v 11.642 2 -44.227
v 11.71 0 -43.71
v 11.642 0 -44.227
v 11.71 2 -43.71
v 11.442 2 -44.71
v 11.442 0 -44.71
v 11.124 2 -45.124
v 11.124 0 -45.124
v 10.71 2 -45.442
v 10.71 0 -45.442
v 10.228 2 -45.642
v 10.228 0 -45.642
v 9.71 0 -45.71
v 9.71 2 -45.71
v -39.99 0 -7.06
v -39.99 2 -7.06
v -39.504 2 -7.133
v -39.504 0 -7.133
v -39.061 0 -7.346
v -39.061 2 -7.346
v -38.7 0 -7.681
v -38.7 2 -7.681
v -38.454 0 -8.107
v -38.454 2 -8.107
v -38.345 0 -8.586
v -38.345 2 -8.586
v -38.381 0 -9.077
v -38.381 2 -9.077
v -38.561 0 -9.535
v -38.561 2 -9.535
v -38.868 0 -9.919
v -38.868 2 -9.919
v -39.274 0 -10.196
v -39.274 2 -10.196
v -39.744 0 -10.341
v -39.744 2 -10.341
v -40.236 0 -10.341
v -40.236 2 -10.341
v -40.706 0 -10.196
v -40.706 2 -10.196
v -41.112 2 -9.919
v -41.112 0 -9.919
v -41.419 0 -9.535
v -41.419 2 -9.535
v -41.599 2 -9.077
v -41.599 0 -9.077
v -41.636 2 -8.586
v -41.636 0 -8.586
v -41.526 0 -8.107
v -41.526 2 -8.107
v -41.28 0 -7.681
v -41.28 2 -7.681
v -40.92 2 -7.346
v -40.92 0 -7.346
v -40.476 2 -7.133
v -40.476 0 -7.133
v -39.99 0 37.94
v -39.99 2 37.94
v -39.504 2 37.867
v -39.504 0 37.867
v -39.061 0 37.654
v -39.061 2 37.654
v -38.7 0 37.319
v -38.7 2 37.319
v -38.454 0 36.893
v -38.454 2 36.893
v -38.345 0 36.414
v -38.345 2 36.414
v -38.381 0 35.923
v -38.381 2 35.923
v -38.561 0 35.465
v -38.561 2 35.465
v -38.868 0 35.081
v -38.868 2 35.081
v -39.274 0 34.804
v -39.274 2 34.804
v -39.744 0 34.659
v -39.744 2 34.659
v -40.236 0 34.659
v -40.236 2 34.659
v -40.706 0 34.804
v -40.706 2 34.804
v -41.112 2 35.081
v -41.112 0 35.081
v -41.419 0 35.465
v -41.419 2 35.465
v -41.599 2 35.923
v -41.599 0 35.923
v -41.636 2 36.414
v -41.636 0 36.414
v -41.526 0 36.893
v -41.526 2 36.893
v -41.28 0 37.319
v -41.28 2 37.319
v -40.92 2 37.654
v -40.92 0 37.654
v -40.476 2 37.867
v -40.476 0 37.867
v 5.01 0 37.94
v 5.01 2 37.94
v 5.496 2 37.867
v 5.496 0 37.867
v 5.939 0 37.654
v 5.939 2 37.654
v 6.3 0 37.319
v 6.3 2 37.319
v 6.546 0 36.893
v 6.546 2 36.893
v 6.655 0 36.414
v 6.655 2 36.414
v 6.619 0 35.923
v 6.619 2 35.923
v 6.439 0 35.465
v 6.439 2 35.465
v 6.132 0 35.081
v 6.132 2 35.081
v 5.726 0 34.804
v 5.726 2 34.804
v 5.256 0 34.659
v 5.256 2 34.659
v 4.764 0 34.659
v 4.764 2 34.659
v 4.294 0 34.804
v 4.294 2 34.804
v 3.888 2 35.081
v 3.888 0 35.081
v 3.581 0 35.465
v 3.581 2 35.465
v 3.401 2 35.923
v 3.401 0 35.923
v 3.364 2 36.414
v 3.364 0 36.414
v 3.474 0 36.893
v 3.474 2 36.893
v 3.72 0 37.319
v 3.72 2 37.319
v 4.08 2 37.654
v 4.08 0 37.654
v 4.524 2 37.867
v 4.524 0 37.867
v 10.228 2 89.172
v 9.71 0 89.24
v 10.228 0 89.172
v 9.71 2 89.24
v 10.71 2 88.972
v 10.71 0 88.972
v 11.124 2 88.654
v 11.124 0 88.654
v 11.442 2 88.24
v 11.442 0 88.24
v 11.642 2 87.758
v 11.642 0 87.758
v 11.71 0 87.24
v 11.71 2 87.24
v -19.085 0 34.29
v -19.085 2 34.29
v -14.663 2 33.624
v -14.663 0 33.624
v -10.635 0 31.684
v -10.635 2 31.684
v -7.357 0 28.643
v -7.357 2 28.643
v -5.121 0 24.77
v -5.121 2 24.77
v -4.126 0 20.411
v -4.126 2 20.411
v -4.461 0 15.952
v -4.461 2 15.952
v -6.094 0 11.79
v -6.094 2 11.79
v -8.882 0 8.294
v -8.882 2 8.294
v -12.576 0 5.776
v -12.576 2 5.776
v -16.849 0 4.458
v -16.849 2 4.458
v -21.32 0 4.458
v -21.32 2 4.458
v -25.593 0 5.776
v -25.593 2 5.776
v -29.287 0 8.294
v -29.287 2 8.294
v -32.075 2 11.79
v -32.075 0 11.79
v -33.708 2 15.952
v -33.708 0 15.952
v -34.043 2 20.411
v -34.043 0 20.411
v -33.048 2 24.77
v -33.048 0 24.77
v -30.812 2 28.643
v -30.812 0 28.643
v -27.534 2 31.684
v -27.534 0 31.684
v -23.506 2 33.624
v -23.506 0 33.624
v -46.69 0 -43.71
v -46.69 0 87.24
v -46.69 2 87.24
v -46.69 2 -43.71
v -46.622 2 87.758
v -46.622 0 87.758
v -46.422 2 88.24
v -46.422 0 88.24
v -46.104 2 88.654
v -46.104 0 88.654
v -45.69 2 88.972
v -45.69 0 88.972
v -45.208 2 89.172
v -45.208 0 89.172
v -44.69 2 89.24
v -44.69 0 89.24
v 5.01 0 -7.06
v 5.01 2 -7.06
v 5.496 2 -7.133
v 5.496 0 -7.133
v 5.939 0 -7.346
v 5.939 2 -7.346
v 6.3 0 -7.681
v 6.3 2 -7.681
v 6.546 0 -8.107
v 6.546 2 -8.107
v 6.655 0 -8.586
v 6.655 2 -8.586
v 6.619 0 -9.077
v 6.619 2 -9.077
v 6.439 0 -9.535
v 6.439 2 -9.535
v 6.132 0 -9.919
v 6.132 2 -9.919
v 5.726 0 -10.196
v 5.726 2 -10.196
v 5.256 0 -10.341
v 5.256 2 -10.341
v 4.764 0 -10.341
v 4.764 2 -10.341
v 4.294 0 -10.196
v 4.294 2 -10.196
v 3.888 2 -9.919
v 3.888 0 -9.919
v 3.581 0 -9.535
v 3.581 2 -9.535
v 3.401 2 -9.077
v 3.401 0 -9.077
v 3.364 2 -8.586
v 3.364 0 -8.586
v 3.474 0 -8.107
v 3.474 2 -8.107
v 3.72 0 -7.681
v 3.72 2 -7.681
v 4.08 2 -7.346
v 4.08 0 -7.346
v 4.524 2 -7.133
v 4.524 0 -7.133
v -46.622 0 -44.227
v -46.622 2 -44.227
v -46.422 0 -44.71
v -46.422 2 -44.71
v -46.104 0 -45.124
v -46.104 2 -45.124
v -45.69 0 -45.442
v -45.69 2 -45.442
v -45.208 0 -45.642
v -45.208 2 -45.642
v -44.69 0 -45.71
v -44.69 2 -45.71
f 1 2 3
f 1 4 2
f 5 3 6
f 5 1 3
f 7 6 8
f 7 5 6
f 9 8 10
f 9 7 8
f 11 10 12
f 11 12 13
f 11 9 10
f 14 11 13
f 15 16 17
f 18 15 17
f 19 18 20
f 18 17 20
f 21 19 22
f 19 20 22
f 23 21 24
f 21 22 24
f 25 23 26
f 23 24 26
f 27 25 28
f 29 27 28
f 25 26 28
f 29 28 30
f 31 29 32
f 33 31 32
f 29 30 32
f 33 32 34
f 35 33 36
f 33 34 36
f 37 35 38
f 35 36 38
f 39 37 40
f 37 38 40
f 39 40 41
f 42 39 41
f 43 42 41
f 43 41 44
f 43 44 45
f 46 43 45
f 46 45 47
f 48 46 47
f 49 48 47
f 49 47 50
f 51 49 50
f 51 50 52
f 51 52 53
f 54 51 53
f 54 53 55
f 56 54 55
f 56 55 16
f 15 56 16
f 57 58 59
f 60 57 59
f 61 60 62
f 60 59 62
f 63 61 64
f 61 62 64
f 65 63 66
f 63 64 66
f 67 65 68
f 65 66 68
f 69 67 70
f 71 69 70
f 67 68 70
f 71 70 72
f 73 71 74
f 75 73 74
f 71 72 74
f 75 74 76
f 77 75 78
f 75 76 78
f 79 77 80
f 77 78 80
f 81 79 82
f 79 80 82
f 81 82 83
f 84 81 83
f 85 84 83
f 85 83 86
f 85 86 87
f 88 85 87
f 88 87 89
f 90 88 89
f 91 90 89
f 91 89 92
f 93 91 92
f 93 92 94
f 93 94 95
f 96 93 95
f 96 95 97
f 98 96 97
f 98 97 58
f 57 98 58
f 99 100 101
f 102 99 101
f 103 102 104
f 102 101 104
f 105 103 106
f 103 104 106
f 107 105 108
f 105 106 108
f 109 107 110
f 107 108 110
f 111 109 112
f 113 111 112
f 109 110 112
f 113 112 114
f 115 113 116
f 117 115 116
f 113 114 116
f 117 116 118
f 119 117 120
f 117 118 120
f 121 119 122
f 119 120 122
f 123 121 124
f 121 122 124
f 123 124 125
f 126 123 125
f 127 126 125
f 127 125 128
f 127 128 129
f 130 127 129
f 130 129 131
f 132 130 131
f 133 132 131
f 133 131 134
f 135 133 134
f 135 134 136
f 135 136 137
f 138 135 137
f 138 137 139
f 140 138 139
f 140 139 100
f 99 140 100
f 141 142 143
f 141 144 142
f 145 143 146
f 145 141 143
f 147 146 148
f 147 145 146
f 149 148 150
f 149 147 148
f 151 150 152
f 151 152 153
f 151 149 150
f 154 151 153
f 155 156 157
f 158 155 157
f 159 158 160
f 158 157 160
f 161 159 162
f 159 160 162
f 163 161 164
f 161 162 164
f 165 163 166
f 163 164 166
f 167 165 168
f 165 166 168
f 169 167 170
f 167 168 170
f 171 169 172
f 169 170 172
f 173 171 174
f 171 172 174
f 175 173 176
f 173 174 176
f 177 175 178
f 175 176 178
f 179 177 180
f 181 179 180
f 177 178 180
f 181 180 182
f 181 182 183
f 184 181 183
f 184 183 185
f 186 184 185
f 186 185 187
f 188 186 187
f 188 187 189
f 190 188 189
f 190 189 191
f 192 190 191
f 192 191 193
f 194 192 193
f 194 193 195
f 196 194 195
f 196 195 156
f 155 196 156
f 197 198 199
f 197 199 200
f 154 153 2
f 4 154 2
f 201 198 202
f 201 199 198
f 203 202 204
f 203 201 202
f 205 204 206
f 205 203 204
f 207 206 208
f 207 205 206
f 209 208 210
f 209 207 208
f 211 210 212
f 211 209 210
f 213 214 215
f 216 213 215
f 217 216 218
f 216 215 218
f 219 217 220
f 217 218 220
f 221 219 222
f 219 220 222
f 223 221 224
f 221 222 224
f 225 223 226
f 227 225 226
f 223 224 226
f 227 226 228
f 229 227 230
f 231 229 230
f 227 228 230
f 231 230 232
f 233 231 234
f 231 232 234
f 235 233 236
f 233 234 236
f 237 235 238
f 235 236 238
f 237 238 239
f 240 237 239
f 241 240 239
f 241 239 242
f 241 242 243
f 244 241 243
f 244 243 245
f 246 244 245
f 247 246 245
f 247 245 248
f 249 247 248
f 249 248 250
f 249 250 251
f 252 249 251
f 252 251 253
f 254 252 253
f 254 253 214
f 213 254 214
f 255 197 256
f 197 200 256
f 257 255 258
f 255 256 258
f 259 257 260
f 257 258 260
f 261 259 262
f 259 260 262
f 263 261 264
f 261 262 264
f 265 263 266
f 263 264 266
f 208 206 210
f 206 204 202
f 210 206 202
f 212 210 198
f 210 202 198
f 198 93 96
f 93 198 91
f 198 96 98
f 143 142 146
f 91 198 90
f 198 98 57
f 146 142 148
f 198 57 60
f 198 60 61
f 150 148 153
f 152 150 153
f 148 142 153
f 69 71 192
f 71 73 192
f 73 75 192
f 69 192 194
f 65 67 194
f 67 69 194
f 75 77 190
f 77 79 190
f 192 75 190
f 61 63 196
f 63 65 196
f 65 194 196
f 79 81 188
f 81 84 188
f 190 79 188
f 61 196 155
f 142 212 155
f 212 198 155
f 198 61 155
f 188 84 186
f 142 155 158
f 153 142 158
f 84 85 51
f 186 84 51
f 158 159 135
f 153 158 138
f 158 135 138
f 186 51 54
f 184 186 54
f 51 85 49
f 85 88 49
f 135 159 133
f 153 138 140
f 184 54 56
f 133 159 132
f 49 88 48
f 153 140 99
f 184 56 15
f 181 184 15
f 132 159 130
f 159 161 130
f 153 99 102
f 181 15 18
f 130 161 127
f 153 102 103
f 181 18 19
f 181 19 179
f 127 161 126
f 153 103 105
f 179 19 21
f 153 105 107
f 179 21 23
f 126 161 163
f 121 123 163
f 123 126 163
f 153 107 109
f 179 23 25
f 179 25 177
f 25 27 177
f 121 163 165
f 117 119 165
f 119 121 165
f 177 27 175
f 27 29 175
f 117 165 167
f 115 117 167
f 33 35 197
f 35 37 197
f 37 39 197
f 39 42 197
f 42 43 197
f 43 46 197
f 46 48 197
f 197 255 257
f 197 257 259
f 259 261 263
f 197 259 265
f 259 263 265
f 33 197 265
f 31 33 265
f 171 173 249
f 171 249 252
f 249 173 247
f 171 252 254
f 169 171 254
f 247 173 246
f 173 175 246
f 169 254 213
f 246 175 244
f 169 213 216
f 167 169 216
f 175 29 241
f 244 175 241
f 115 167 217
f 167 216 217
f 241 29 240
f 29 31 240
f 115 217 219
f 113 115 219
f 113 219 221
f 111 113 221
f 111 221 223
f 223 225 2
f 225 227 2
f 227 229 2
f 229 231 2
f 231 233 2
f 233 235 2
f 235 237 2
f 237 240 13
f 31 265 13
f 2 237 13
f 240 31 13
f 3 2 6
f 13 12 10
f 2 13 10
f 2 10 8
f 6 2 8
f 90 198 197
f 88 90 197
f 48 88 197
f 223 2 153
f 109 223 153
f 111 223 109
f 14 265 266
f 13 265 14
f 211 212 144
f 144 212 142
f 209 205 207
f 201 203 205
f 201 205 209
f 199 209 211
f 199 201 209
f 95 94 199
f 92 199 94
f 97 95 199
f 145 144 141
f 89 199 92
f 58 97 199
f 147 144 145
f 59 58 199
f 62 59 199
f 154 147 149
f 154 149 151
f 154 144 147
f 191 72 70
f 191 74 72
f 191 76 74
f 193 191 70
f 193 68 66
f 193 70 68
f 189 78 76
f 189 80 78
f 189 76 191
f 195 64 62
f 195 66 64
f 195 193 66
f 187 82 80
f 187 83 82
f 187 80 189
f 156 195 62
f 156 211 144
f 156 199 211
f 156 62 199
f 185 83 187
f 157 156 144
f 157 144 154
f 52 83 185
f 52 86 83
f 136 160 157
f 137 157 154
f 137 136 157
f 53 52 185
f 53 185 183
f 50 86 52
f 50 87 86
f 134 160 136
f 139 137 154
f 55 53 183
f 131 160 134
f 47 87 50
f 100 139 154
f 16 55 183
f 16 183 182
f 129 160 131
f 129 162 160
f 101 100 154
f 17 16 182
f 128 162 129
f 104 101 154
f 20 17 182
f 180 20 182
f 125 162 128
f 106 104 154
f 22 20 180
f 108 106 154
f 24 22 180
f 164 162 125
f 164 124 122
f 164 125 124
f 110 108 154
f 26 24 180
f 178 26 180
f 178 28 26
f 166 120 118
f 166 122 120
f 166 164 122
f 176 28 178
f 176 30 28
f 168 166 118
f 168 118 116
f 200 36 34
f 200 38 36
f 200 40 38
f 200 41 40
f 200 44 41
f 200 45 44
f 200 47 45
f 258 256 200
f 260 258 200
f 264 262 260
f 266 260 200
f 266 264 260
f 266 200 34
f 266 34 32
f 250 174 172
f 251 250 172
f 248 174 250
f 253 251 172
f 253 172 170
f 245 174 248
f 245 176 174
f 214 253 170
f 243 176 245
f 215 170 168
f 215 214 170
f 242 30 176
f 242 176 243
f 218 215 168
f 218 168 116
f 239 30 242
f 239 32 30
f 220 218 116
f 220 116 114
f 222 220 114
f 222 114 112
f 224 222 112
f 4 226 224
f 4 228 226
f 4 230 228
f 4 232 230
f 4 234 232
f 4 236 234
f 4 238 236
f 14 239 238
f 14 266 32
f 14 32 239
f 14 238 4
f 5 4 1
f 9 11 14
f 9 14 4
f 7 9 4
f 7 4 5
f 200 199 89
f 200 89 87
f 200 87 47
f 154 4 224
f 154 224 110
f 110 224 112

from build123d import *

# Parameters (mm, degrees)
SKETCH1_W           = 58.4
SKETCH1_H           = 134.95
BOSS_EXTRUDE1_DEPTH = 2
FILLET1_R           = 2
SKETCH2_R           = 1.65
CUT_EXTRUDE1_DEPTH  = 101.736235674
SKETCH3_R           = 15
CUT_EXTRUDE2_DEPTH  = 101.736235674


with BuildPart() as part:
    # Sketch1 → Boss-Extrude1 (new body)
    with BuildSketch(Plane(origin=(0, 0, 0), x_dir=(1, 0, 0), z_dir=(0, 1, 0))):
        with Locations((-17.49012047, -21.765247804)):
            Rectangle(SKETCH1_W, SKETCH1_H)
    extrude(amount=BOSS_EXTRUDE1_DEPTH)

    # Fillet1
    fillet1_edges = [part.edges().sort_by_distance(p)[0] for p in [
        (-46.69012047, 1, -45.709752196),
        (11.70987953, 1, -45.709752196),
        (11.70987953, 1, 89.240247804),
        (-46.69012047, 1, 89.240247804),
    ]]
    fillet(fillet1_edges, radius=FILLET1_R)

    # Sketch2 → Cut-Extrude1 (cut, through all)
    with BuildSketch(Plane(origin=(0, 2, 0), x_dir=(1, 0, 0), z_dir=(0, 1, 0))):
        with Locations(Location((-39.99012047, 8.709752196, 0), (0, 0, 270))):
            Circle(SKETCH2_R)
        with Locations(Location((5.00987953, 8.709752196, 0), (0, 0, 270))):
            Circle(SKETCH2_R)
        with Locations(Location((5.00987953, -36.290247804, 0), (0, 0, 270))):
            Circle(SKETCH2_R)
        with Locations(Location((-39.99012047, -36.290247804, 0), (0, 0, 270))):
            Circle(SKETCH2_R)
    extrude(amount=-CUT_EXTRUDE1_DEPTH, mode=Mode.SUBTRACT)

    # Sketch3 → Cut-Extrude2 (cut, through all)
    with BuildSketch(Plane(origin=(0, 2, 0), x_dir=(1, 0, 0), z_dir=(0, 1, 0))):
        with Locations(Location((-19.084532275, -19.290247804, 0), (0, 0, 270))):
            Circle(SKETCH3_R)
    extrude(amount=-CUT_EXTRUDE2_DEPTH, mode=Mode.SUBTRACT)


solid = part.part
